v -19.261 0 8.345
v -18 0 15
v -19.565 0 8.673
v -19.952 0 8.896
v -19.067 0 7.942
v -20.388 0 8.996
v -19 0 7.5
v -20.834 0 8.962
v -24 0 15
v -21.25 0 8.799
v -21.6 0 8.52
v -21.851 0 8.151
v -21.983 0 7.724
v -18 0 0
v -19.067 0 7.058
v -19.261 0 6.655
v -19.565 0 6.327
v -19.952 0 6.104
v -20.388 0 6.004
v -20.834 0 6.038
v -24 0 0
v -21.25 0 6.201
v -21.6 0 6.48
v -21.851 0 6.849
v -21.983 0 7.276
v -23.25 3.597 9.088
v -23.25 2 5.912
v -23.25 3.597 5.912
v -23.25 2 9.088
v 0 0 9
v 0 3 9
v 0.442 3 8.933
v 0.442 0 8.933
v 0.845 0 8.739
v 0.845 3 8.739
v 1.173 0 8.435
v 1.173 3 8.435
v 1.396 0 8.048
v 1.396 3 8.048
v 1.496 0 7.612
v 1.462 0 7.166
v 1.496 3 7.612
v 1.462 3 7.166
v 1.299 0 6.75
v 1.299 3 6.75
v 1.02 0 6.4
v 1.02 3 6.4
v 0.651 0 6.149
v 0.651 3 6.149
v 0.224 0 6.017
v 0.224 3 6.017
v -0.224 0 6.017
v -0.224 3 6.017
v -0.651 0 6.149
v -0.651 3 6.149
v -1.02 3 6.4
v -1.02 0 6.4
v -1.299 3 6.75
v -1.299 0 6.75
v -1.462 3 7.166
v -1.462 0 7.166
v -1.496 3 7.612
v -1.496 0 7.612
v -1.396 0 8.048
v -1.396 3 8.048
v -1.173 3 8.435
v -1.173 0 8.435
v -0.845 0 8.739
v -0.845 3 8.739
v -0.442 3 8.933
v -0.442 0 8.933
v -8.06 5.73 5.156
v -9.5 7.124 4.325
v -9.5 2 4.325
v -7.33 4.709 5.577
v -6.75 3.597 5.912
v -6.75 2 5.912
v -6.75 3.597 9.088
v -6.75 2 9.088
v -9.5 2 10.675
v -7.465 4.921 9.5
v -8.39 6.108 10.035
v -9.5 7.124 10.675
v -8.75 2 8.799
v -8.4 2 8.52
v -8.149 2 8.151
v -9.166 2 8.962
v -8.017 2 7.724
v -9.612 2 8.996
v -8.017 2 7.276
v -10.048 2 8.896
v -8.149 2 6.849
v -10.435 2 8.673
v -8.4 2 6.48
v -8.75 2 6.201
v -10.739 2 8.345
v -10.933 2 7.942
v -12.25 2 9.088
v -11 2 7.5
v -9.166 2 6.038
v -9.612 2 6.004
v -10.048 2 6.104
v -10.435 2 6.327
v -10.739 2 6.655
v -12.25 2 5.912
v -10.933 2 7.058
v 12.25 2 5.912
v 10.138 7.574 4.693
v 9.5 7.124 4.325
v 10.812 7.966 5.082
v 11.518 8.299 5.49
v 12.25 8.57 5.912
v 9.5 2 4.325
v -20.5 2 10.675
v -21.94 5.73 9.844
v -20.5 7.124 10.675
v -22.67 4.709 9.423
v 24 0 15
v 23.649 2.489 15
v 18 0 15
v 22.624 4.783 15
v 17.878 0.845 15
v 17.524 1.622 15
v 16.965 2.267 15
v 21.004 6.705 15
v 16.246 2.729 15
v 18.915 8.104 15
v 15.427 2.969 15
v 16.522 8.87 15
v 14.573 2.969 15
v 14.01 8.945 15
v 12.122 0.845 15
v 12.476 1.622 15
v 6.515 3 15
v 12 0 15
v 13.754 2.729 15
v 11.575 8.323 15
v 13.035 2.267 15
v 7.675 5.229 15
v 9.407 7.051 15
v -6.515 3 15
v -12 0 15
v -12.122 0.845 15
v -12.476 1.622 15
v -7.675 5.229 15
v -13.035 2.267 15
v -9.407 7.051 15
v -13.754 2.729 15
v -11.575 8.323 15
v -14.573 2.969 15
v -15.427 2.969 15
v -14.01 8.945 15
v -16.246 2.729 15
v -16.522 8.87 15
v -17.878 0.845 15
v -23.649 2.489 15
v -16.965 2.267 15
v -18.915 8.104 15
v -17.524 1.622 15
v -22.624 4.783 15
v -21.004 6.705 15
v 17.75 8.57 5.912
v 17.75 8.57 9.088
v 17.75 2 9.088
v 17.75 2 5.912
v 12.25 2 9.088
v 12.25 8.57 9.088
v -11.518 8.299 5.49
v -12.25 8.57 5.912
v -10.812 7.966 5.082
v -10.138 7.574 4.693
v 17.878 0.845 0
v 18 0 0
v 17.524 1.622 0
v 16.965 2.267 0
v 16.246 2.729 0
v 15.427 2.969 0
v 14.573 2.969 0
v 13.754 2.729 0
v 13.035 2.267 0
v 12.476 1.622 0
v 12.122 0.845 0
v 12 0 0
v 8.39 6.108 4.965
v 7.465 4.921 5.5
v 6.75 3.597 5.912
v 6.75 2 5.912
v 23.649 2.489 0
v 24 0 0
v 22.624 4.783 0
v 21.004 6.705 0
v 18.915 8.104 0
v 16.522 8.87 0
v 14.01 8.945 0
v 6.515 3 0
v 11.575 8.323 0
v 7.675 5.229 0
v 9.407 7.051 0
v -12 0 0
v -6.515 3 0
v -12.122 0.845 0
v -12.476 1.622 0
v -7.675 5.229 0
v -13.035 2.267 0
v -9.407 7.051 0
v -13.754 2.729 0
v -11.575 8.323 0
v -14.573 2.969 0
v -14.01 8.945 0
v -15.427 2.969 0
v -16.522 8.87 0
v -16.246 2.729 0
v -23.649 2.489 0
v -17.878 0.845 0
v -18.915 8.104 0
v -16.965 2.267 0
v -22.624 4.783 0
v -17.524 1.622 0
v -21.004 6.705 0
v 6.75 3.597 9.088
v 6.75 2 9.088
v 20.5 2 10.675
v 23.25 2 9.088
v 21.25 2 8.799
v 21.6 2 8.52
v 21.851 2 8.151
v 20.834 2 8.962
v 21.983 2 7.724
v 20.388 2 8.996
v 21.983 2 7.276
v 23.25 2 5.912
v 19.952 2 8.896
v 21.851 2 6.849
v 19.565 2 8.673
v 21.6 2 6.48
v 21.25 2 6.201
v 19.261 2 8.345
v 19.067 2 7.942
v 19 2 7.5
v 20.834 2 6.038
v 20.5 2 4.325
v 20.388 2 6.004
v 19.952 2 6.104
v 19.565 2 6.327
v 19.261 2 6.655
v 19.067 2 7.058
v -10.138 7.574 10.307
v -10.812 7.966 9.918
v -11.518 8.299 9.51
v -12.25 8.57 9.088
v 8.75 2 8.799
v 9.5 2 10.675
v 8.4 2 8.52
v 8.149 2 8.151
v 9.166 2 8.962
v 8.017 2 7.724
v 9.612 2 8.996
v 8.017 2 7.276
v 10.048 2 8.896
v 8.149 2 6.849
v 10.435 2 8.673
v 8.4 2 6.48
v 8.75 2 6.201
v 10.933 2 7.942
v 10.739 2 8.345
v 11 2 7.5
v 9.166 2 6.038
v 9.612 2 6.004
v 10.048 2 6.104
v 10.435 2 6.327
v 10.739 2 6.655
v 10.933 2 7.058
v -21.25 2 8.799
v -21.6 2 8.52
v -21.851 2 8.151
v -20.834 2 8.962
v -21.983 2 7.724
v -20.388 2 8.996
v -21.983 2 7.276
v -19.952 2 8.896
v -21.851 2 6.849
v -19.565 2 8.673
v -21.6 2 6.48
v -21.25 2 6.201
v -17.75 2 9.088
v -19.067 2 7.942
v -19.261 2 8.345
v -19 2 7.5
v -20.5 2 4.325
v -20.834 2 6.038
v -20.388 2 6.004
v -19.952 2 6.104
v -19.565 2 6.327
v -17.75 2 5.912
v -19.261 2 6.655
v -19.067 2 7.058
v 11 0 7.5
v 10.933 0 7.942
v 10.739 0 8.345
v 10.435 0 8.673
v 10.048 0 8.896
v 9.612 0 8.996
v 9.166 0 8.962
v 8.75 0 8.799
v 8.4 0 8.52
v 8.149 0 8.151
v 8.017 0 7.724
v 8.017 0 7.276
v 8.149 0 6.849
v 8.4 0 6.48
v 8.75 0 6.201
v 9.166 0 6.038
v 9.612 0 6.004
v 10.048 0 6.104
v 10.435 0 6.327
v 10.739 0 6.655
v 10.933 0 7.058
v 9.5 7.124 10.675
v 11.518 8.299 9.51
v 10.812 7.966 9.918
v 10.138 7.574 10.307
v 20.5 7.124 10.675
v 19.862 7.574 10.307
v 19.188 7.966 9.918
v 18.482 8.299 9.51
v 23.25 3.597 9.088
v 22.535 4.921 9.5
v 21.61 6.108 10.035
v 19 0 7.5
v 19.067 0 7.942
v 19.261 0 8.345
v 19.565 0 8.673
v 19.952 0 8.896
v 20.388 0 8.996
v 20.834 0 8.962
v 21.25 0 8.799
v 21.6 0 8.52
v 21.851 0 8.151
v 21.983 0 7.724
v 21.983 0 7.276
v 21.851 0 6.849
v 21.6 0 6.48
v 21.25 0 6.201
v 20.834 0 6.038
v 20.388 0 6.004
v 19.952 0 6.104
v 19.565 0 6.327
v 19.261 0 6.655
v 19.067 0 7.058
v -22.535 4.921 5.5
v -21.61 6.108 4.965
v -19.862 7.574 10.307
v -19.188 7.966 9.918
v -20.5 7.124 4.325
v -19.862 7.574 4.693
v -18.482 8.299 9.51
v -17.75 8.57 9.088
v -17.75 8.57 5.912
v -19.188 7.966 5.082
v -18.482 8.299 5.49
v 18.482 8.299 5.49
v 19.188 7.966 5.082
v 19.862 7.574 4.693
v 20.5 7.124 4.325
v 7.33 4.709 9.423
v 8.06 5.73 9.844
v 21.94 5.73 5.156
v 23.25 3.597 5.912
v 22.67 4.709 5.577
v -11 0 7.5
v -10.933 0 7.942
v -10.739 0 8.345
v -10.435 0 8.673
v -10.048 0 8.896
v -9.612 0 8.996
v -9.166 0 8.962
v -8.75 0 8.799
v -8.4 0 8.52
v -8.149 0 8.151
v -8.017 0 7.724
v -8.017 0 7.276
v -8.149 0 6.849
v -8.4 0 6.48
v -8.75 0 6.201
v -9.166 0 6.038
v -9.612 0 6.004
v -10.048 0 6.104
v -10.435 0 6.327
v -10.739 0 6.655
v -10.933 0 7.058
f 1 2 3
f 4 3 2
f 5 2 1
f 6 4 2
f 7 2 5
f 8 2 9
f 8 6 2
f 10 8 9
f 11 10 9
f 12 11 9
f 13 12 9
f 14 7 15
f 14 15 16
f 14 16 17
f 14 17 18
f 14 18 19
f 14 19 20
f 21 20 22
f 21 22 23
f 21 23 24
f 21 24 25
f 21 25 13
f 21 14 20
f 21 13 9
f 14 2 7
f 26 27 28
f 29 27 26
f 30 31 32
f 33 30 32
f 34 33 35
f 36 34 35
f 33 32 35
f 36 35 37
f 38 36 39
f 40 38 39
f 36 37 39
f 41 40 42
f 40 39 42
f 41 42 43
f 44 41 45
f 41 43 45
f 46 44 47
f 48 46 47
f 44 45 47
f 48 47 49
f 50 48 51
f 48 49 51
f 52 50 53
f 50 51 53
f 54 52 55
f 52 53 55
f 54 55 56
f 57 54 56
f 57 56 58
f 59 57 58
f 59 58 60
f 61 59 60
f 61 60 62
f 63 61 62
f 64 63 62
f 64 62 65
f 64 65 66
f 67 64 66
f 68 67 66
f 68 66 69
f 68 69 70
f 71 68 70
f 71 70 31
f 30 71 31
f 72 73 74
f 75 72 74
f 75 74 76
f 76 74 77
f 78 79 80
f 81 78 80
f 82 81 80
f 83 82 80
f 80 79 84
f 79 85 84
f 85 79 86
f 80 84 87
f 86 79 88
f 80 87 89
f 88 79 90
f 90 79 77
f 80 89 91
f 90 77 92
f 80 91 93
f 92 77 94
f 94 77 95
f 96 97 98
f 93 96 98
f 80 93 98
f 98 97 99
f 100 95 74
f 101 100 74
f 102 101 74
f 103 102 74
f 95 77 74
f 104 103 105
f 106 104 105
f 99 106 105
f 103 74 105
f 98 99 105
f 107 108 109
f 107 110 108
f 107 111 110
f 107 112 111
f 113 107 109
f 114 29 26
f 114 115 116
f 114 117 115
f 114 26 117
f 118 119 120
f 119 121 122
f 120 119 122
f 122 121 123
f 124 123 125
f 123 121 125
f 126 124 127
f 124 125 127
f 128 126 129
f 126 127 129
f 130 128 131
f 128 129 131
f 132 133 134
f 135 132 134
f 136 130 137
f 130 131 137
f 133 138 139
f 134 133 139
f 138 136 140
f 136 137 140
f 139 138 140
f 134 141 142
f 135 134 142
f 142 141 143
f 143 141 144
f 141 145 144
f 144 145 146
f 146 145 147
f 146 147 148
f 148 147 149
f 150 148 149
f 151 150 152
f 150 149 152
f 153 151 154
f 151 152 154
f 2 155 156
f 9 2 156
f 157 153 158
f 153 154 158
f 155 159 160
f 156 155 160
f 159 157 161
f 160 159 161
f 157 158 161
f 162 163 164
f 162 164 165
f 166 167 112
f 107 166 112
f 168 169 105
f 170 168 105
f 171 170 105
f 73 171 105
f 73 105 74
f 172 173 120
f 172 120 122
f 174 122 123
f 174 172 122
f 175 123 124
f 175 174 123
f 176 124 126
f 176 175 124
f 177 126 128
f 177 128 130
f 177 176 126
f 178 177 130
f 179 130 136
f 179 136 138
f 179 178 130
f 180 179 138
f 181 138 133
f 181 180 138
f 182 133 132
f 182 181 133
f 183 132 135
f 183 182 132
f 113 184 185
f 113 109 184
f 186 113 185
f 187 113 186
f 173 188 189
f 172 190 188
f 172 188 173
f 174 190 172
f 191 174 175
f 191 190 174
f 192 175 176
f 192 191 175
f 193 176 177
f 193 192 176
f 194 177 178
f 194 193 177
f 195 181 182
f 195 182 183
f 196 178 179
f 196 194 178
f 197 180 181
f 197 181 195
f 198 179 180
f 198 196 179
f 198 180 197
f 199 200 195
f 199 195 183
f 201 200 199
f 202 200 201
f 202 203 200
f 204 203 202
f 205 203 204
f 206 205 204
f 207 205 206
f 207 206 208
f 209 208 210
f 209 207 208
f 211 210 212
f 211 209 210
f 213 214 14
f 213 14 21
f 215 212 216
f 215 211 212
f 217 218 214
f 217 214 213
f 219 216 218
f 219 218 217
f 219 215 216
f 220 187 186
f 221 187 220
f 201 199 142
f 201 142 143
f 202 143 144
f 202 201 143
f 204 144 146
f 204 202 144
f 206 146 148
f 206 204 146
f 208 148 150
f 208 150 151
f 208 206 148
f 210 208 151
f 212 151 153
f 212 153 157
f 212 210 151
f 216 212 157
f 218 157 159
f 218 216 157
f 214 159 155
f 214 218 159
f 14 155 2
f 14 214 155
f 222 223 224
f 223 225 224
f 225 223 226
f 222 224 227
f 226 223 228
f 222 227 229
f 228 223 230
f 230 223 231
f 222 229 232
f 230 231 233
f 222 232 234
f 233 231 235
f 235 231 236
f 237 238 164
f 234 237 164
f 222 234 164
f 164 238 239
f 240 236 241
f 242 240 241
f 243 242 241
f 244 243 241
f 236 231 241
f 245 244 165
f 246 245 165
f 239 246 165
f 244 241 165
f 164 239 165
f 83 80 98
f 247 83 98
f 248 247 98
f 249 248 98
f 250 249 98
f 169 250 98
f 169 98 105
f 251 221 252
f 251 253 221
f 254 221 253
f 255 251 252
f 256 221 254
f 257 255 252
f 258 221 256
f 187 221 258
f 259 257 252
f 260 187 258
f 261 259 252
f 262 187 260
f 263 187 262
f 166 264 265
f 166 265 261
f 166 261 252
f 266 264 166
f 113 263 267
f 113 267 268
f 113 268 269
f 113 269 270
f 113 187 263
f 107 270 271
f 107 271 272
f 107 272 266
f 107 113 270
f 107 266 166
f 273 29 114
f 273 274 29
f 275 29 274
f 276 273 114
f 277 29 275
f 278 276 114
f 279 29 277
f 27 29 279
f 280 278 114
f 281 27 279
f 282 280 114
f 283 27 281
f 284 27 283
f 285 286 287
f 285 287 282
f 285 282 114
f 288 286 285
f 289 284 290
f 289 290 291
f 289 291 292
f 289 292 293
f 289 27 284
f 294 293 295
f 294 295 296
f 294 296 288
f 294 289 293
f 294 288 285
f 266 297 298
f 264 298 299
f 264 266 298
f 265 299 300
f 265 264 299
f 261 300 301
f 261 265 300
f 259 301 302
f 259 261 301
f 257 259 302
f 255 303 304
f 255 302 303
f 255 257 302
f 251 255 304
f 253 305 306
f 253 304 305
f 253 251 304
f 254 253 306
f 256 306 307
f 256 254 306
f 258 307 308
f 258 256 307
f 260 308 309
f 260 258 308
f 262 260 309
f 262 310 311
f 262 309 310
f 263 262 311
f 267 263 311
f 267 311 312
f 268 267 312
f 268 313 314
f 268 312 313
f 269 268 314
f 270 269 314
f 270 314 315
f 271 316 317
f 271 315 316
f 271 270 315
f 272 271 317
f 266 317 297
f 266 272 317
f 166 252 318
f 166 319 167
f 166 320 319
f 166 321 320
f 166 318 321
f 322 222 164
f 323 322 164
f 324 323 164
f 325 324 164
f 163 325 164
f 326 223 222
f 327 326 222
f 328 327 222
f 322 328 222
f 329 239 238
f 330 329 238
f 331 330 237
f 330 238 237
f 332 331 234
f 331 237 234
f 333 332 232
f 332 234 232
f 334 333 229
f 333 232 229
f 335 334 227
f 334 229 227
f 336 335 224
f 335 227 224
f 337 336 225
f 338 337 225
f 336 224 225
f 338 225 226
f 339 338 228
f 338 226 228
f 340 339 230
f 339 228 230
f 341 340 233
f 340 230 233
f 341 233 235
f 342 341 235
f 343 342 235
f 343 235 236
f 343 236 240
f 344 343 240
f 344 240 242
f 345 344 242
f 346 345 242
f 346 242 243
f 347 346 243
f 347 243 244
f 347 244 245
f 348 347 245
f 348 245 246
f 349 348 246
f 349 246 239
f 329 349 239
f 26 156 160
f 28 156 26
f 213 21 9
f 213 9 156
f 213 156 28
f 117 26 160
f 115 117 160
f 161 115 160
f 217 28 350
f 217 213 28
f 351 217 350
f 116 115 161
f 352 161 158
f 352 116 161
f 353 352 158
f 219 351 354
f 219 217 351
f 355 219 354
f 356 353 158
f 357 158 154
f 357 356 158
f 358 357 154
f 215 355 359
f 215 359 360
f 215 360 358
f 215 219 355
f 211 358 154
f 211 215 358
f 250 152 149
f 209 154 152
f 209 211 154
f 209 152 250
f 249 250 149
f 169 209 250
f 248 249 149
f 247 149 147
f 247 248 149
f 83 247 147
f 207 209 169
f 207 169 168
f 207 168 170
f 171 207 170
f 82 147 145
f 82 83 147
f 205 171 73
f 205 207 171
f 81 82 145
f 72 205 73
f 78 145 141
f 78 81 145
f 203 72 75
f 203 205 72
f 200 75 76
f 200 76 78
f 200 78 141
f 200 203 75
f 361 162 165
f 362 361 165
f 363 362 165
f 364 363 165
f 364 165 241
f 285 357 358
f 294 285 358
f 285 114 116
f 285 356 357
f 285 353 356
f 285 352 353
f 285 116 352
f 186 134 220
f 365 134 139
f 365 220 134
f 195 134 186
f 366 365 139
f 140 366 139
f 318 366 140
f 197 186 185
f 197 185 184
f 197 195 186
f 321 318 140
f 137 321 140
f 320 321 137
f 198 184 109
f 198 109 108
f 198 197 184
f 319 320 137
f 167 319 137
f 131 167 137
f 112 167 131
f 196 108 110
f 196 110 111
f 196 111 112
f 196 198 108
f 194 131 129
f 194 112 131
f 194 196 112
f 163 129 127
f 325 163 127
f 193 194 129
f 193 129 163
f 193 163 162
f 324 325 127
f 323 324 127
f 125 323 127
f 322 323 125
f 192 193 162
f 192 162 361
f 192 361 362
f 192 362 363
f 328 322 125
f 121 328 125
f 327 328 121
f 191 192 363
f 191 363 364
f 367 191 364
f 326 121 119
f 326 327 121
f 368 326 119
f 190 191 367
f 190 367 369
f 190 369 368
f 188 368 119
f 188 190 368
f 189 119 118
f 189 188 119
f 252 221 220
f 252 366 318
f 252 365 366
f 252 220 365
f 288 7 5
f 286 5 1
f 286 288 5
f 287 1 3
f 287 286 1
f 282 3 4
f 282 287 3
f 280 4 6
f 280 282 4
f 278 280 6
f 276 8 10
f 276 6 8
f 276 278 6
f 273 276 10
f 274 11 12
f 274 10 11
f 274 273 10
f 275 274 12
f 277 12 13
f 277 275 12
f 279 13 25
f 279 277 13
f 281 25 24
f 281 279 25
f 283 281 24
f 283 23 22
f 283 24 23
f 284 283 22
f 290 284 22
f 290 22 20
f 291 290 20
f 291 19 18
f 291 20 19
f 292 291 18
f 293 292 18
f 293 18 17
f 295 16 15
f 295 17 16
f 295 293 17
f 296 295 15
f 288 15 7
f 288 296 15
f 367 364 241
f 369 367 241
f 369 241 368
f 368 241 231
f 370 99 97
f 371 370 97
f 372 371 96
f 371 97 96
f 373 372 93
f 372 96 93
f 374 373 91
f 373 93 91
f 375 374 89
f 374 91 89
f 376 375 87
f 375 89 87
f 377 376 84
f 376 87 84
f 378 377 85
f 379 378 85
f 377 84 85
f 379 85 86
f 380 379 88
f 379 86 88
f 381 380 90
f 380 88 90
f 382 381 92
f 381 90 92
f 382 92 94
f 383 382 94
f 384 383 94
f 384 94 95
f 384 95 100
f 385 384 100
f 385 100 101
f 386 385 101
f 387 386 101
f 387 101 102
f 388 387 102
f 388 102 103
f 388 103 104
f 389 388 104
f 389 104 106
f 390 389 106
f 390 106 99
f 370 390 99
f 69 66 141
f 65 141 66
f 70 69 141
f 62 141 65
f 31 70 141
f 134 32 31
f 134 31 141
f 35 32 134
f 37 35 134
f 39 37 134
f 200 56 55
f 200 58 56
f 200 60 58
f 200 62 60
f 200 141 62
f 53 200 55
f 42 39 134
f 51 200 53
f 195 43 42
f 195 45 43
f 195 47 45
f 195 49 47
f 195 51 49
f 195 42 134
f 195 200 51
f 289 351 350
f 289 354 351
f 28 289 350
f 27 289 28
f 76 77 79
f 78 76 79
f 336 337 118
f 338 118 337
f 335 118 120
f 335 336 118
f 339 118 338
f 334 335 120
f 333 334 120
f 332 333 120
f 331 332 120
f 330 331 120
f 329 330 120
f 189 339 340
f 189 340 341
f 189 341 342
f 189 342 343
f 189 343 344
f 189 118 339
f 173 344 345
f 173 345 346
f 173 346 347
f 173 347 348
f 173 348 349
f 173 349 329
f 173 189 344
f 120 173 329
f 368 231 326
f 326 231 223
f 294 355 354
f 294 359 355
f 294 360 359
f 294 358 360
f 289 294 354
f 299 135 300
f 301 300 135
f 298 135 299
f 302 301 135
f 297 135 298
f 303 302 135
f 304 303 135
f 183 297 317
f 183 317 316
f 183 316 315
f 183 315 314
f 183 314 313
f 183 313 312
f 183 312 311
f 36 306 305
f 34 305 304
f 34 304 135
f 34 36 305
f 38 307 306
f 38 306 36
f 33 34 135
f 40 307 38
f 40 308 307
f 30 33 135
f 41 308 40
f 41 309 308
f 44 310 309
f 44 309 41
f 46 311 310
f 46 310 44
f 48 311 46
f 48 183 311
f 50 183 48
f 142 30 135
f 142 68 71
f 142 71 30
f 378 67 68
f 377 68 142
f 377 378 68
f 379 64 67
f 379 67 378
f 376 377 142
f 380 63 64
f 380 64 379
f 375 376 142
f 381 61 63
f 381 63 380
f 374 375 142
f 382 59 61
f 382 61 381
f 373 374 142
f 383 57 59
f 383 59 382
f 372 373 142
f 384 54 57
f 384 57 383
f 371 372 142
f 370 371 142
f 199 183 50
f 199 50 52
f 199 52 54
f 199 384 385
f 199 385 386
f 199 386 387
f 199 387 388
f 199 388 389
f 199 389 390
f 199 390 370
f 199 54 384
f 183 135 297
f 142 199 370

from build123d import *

# Parameters (mm, degrees)
BOSS_EXTRUDE1_DEPTH     = 15
CUT_EXTRUDE1_DEPTH      = 30
SKETCH3_R               = 1.5
CUT_EXTRUDE2_DEPTH      = 30
MIRROR2_COPY_1_DEPTH    = 30
MIRROR2_COPY_2_SKETCH_R = 1.5
MIRROR2_COPY_2_DEPTH    = 30
SKETCH4_R               = 1.5
CUT_EXTRUDE3_DEPTH      = 5


with BuildPart() as part:
    # Sketch1 → Boss-Extrude1 (new body)
    with BuildSketch(Plane.XY):
        with BuildLine():
            Line((12, 0), (-12, 0))
            ThreePointArc((-12, 0), (-15, 3), (-18, 0))
            Line((-18, 0), (-24, 0))
            ThreePointArc((-24, 0), (-16.521917809, 8.870387037), (-6.514718626, 3))
            Line((-6.514718626, 3), (6.514718626, 3))
            ThreePointArc((6.514718626, 3), (16.521917809, 8.870387037), (24, 0))
            Line((24, 0), (18, 0))
            ThreePointArc((18, 0), (15, 3), (12, 0))
        make_face()
    extrude(amount=BOSS_EXTRUDE1_DEPTH)

    # Sketch2 → Cut-Extrude1 (cut)
    with BuildSketch(Plane(origin=(0, 2, 0), x_dir=(-1, 0, 0), z_dir=(0, -1, 0))):
        Polygon((-20.5, -10.675426481), (-17.75, -9.08771324), (-17.75, -5.91228676), (-20.5, -4.324573519), (-23.25, -5.91228676), (-23.25, -9.08771324), align=None)
    cut_extrude1 = extrude(amount=-CUT_EXTRUDE1_DEPTH, mode=Mode.SUBTRACT)

    # Sketch3 → Cut-Extrude2 (cut)
    with BuildSketch(Plane(origin=(0, 2, 0), x_dir=(1, 0, 0), z_dir=(0, 1, 0))):
        with Locations((20.5, -7.5)):
            Circle(SKETCH3_R)
    cut_extrude2 = extrude(amount=-CUT_EXTRUDE2_DEPTH, mode=Mode.SUBTRACT)

    # Mirror1: Cut-Extrude1, Cut-Extrude2 across plane
    add(cut_extrude1.mirror(Plane.ZY.offset(-15)), mode=Mode.SUBTRACT)
    add(cut_extrude2.mirror(Plane.ZY.offset(-15)), mode=Mode.SUBTRACT)

    # Mirror2: Cut-Extrude1, Cut-Extrude2 across plane
    add(cut_extrude1.mirror(Plane(origin=(0, 0, 0), x_dir=(0, 0, 1), z_dir=(1, 0, 0))), mode=Mode.SUBTRACT)
    add(cut_extrude2.mirror(Plane(origin=(0, 0, 0), x_dir=(0, 0, 1), z_dir=(1, 0, 0))), mode=Mode.SUBTRACT)

    # Mirror2 copy 1 sketch → Mirror2 copy 1 (cut)
    with BuildSketch(Plane(origin=(-30, 2, 0), x_dir=(-1, 0, 0), z_dir=(0, -1, 0))):
        Polygon((-20.5, -10.675426481), (-17.75, -9.08771324), (-17.75, -5.91228676), (-20.5, -4.324573519), (-23.25, -5.91228676), (-23.25, -9.08771324), align=None)
    extrude(amount=-MIRROR2_COPY_1_DEPTH, mode=Mode.SUBTRACT)

    # Mirror2 copy 2 sketch → Mirror2 copy 2 (cut)
    with BuildSketch(Plane(origin=(-30, 2, 0), x_dir=(1, 0, 0), z_dir=(0, 1, 0))):
        with Locations((20.5, -7.5)):
            Circle(MIRROR2_COPY_2_SKETCH_R)
    extrude(amount=-MIRROR2_COPY_2_DEPTH, mode=Mode.SUBTRACT)

    # Sketch4 → Cut-Extrude3 (cut)
    with BuildSketch(Plane(origin=(0, 3, 0), x_dir=(1, 0, 0), z_dir=(0, 1, 0))):
        with Locations((0, -7.5)):
            Circle(SKETCH4_R)
    extrude(amount=-CUT_EXTRUDE3_DEPTH, mode=Mode.SUBTRACT)


solid = part.part
